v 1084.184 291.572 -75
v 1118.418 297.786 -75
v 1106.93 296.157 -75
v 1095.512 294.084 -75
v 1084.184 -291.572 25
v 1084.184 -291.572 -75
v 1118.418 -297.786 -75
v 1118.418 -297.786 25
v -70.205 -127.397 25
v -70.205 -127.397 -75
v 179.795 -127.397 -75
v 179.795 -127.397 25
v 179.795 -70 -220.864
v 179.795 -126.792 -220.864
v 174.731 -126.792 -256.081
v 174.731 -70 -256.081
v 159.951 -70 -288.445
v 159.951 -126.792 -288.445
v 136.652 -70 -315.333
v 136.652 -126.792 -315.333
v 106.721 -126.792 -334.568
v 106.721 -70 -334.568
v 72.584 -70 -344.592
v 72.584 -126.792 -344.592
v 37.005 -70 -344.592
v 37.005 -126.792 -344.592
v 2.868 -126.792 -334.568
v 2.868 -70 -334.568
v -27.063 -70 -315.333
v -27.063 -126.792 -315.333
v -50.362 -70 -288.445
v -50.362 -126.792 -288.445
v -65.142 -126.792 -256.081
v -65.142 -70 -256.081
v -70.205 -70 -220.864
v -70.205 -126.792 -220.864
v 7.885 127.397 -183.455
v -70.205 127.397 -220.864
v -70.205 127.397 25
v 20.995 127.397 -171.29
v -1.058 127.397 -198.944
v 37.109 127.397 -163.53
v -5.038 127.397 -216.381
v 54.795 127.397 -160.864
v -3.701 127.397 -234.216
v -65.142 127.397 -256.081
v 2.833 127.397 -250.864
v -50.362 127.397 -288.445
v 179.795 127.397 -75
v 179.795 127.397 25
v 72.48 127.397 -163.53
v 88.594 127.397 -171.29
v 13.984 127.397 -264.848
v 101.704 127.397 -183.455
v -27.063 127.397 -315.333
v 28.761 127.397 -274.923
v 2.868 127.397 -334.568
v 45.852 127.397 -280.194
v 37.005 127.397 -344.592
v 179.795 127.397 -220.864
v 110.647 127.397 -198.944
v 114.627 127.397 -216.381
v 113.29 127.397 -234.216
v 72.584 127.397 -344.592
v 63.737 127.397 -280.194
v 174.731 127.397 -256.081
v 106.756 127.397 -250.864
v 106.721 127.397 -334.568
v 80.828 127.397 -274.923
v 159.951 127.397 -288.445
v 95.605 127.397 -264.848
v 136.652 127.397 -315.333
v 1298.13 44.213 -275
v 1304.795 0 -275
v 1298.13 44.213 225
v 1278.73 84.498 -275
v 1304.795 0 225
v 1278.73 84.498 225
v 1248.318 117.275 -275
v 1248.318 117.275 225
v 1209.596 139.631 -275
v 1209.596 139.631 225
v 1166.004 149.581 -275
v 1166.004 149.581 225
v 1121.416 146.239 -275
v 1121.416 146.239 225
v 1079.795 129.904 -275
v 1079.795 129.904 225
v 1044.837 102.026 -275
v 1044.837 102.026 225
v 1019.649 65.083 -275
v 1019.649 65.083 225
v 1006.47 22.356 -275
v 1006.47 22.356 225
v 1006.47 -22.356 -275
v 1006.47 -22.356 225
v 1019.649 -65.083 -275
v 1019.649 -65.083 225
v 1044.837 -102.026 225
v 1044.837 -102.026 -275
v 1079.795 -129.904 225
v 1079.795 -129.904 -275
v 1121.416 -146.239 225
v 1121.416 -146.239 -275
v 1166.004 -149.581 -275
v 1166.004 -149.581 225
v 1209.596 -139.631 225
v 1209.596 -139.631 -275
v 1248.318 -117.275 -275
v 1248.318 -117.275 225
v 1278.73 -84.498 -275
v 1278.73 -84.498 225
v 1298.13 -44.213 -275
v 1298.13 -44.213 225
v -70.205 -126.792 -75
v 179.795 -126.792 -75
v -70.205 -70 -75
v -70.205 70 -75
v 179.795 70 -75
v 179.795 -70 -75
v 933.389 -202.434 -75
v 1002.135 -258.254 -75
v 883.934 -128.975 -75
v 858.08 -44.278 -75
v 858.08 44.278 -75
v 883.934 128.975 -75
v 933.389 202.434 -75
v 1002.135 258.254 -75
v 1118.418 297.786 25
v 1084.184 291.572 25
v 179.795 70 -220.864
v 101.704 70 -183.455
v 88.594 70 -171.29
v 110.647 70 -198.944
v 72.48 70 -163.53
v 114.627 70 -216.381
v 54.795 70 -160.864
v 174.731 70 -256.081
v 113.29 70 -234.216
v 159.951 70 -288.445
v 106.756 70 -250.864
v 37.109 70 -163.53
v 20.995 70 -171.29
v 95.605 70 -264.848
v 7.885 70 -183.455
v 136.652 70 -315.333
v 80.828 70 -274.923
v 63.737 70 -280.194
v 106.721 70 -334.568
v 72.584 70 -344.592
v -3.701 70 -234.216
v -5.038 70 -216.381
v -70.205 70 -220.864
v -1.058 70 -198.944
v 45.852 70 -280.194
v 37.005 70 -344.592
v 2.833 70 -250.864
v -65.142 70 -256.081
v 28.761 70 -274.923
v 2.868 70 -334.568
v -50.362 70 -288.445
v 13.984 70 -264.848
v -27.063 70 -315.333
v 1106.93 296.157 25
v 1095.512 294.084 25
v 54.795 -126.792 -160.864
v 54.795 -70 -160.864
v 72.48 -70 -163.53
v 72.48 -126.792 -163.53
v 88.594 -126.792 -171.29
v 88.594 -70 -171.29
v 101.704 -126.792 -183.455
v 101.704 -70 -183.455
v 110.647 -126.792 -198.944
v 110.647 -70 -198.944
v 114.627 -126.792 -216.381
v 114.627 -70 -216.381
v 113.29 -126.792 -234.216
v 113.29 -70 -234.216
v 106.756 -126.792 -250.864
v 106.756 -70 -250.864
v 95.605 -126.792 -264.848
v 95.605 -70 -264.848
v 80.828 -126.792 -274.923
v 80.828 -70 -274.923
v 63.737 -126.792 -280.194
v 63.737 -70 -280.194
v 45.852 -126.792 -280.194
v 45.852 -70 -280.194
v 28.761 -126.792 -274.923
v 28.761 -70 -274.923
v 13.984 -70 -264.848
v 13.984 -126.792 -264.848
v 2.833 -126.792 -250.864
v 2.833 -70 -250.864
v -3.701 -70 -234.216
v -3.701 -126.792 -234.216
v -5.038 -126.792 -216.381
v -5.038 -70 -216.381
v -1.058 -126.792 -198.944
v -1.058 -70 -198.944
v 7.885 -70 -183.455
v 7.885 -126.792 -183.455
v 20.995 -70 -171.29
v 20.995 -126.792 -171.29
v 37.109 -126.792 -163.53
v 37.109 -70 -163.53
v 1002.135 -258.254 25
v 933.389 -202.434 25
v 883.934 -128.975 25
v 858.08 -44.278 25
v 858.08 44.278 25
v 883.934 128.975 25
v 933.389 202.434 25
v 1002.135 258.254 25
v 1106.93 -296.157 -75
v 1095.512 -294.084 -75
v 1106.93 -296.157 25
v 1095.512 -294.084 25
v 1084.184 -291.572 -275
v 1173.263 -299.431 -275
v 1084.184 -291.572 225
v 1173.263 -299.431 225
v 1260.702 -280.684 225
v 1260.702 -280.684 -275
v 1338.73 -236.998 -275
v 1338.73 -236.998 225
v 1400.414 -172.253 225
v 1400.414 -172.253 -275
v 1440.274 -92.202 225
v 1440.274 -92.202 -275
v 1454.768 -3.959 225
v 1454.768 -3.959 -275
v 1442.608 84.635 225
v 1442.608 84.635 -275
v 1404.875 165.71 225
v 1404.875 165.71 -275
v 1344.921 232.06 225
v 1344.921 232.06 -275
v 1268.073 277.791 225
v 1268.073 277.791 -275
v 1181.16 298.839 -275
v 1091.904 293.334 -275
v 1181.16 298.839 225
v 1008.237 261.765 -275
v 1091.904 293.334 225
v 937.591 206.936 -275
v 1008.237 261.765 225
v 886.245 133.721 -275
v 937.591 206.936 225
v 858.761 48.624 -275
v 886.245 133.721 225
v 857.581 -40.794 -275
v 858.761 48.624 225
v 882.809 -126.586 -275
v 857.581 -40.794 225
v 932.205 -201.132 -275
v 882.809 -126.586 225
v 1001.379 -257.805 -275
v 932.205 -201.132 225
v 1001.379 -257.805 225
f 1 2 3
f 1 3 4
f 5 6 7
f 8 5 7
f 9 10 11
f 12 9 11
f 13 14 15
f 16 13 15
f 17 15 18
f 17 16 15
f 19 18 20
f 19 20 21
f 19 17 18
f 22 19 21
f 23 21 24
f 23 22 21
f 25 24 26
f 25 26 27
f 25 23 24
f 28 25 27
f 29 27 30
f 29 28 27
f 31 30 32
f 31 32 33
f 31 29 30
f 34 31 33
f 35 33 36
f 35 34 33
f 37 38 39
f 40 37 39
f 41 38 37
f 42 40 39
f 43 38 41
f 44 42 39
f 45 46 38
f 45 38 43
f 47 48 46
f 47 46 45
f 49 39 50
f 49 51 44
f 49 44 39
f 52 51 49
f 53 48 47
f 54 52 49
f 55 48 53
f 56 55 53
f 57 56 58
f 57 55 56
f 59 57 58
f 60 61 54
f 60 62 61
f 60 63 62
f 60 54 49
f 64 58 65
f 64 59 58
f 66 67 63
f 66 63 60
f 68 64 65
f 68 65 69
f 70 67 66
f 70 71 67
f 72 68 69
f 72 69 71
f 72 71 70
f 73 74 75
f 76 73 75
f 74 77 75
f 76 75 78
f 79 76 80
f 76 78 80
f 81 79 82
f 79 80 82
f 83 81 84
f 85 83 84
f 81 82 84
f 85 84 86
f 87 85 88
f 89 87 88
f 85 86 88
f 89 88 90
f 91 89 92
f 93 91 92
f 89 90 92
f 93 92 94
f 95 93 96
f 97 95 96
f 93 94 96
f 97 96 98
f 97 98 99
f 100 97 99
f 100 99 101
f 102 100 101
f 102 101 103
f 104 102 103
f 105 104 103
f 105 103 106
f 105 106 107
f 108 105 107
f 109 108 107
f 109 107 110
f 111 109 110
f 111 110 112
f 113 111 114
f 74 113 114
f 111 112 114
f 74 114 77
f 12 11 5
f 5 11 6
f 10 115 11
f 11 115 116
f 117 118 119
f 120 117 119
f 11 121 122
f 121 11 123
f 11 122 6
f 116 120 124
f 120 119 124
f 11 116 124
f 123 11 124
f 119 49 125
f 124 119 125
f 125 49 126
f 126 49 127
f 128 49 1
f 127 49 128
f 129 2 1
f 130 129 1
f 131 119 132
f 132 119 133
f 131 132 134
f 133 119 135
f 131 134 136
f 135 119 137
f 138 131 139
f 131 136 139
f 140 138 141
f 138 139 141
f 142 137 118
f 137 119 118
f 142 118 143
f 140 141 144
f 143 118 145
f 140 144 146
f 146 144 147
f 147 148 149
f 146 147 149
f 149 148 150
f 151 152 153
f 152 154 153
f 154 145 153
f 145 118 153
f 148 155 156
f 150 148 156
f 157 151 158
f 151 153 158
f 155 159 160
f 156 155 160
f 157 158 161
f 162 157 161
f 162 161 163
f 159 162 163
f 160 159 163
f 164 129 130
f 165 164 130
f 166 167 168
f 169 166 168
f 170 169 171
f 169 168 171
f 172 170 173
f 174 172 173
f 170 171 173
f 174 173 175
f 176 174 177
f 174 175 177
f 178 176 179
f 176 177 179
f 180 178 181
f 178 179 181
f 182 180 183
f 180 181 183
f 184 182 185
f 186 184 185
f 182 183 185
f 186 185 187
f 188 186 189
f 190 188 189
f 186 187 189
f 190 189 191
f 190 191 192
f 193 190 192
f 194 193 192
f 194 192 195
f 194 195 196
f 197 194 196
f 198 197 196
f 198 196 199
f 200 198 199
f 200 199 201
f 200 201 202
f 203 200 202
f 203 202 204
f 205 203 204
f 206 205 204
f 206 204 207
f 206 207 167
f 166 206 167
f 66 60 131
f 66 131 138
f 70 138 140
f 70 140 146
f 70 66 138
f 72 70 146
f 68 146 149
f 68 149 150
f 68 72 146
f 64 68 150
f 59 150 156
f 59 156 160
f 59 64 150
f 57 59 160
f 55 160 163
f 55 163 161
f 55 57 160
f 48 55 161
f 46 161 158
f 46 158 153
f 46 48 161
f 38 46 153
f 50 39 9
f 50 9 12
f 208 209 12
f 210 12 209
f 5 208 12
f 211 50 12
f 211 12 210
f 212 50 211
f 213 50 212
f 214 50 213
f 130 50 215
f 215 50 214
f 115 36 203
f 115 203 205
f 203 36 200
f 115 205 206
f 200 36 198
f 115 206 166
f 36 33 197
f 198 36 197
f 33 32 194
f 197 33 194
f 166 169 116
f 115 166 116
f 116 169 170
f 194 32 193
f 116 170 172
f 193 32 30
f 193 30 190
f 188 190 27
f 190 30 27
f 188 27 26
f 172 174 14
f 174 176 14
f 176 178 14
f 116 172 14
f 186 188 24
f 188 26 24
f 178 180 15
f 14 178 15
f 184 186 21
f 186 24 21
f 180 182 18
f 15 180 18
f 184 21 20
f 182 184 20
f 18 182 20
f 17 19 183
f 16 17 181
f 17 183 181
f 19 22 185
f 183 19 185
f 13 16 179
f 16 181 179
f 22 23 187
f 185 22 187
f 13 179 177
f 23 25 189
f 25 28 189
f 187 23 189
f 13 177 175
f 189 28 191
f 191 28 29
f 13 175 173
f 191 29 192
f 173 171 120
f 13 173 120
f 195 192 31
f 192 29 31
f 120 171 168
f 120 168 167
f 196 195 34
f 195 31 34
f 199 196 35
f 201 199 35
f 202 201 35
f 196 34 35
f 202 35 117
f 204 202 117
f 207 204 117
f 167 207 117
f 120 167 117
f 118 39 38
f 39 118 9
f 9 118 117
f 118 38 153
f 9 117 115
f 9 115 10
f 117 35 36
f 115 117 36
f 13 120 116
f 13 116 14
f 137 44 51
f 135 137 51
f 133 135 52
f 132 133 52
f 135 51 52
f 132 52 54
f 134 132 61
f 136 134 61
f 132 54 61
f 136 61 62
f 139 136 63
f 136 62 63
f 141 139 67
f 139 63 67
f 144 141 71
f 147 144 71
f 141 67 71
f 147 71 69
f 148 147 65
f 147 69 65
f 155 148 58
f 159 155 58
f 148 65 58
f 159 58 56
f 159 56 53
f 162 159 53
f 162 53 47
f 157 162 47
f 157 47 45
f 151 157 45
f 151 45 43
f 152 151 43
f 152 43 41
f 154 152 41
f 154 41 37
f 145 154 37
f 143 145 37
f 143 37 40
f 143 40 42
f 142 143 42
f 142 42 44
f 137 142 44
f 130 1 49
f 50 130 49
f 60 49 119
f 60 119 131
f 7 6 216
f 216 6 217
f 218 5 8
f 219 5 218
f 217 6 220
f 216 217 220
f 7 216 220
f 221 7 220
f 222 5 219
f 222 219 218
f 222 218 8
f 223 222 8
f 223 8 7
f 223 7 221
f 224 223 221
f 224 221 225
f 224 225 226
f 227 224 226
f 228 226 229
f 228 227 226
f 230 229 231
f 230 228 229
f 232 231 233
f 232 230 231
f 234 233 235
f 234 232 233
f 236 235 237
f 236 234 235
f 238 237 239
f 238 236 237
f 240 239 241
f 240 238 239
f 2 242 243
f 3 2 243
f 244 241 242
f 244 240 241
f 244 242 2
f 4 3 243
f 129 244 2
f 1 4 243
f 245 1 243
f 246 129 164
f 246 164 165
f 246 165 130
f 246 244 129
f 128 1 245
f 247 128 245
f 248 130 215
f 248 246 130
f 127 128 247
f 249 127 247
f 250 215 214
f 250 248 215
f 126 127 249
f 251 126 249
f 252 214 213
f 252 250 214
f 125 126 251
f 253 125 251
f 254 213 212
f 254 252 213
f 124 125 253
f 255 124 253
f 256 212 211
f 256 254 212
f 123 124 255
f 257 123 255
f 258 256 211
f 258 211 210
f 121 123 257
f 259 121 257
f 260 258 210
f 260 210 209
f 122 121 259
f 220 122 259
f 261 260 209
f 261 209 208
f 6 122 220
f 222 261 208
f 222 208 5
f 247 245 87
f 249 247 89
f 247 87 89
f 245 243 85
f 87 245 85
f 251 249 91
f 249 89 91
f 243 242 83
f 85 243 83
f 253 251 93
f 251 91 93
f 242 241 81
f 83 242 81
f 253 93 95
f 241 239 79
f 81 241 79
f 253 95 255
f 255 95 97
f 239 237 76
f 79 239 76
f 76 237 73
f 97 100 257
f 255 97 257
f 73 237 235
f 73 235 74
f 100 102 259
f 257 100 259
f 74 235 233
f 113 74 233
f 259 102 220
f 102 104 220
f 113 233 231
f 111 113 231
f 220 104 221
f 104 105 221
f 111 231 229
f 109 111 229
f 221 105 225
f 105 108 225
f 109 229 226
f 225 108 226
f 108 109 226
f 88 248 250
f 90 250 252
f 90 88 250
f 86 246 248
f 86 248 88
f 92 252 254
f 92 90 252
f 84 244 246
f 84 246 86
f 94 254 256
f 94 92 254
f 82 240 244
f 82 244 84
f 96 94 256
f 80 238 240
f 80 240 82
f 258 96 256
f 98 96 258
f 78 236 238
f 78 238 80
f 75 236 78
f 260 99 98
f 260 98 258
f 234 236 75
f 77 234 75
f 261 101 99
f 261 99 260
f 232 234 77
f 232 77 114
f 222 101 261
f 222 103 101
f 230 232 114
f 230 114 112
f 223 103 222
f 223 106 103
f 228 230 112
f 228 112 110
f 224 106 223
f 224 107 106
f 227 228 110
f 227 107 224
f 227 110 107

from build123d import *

# Parameters (mm, degrees)
SKETCH1_R           = 150
BOSS_EXTRUDE3_DEPTH = 25
SKETCH6_R           = 300
SKETCH6_R_2         = 150
BOSS_EXTRUDE6_DEPTH = 200
SKETCH9_R           = 60
BOSS_EXTRUDE8_DEPTH = 254.189683417
SKETCH10_W          = 145.864440971
SKETCH10_H          = 70
SKETCH10_W_2        = 154.135559029
CUT_EXTRUDE1_DEPTH  = 300


with BuildPart() as part:
    # Sketch1 → Boss-Extrude3 (new body, symmetric)
    with BuildSketch(Plane.XY):
        with BuildLine():
            Line((179.794520548, 127.397260274), (-70.205479452, 127.397260274))
            Line((-70.205479452, 127.397260274), (-70.205479452, -127.397260274))
            Line((-70.205479452, -127.397260274), (179.794520548, -127.397260274))
            Line((179.794520548, -127.397260274), (1084.183927904, -291.571850847))
            Line((1084.183927904, -291.571850847), (1118.418389374, -297.786462219))
            ThreePointArc((1118.418389374, -297.786462219), (1454.794520548, 0), (1118.418389374, 297.786462219))
            Line((1118.418389374, 297.786462219), (1084.183927904, 291.571850847))
            Line((1084.183927904, 291.571850847), (179.794520548, 127.397260274))
        make_face()
        with Locations((1154.794520548, 0)):
            Circle(SKETCH1_R, mode=Mode.SUBTRACT)
    boss_extrude3 = extrude(amount=BOSS_EXTRUDE3_DEPTH, both=True)

    # Sketch6 → Boss-Extrude6 (add)
    with BuildSketch(Plane.XY.offset(25)):
        with Locations(Location((1154.794520548, 0, 0), (0, 0, 256.386646044))):  # turned: the seam where the file's is
            Circle(SKETCH6_R)
        with Locations((1154.794520548, 0)):
            Circle(SKETCH6_R_2, mode=Mode.SUBTRACT)
    boss_extrude6 = extrude(amount=BOSS_EXTRUDE6_DEPTH)

    # Mirror1: Boss-Extrude3, Boss-Extrude6 across plane
    add(boss_extrude3.mirror(Plane.XY.offset(-25)))
    add(boss_extrude6.mirror(Plane.XY.offset(-25)))

    # Sketch9 → Boss-Extrude8 (add)
    with BuildSketch(Plane(origin=(0, 127.397260274, 0), x_dir=(1, 0, 0), z_dir=(0, 1, 0))):
        with BuildLine():
            Line((179.794520548, 75), (179.794520548, 220.864440971))
            ThreePointArc((179.794520548, 220.864440971), (54.794520548, 345.864440971), (-70.205479452, 220.864440971))
            Line((-70.205479452, 220.864440971), (-70.205479452, 75))
            Line((-70.205479452, 75), (179.794520548, 75))
        make_face()
        with Locations(Location((54.794520548, 220.864440971, 0), (0, 0, 270))):  # turned: the seam where the file's is
            Circle(SKETCH9_R, mode=Mode.SUBTRACT)
    extrude(amount=-BOSS_EXTRUDE8_DEPTH)

    # Sketch10 → Cut-Extrude1 (cut)
    with BuildSketch(Plane.ZY.offset(70.205479452)):
        with Locations((-147.932220486, -35)):
            Rectangle(SKETCH10_W, SKETCH10_H)
        with Locations((-297.932220486, -35)):
            Rectangle(SKETCH10_W_2, SKETCH10_H)
        with Locations((-297.932220486, 35)):
            Rectangle(SKETCH10_W_2, SKETCH10_H)
        with Locations((-147.932220486, 35)):
            Rectangle(SKETCH10_W, SKETCH10_H)
    extrude(amount=-CUT_EXTRUDE1_DEPTH, mode=Mode.SUBTRACT)


solid = part.part
